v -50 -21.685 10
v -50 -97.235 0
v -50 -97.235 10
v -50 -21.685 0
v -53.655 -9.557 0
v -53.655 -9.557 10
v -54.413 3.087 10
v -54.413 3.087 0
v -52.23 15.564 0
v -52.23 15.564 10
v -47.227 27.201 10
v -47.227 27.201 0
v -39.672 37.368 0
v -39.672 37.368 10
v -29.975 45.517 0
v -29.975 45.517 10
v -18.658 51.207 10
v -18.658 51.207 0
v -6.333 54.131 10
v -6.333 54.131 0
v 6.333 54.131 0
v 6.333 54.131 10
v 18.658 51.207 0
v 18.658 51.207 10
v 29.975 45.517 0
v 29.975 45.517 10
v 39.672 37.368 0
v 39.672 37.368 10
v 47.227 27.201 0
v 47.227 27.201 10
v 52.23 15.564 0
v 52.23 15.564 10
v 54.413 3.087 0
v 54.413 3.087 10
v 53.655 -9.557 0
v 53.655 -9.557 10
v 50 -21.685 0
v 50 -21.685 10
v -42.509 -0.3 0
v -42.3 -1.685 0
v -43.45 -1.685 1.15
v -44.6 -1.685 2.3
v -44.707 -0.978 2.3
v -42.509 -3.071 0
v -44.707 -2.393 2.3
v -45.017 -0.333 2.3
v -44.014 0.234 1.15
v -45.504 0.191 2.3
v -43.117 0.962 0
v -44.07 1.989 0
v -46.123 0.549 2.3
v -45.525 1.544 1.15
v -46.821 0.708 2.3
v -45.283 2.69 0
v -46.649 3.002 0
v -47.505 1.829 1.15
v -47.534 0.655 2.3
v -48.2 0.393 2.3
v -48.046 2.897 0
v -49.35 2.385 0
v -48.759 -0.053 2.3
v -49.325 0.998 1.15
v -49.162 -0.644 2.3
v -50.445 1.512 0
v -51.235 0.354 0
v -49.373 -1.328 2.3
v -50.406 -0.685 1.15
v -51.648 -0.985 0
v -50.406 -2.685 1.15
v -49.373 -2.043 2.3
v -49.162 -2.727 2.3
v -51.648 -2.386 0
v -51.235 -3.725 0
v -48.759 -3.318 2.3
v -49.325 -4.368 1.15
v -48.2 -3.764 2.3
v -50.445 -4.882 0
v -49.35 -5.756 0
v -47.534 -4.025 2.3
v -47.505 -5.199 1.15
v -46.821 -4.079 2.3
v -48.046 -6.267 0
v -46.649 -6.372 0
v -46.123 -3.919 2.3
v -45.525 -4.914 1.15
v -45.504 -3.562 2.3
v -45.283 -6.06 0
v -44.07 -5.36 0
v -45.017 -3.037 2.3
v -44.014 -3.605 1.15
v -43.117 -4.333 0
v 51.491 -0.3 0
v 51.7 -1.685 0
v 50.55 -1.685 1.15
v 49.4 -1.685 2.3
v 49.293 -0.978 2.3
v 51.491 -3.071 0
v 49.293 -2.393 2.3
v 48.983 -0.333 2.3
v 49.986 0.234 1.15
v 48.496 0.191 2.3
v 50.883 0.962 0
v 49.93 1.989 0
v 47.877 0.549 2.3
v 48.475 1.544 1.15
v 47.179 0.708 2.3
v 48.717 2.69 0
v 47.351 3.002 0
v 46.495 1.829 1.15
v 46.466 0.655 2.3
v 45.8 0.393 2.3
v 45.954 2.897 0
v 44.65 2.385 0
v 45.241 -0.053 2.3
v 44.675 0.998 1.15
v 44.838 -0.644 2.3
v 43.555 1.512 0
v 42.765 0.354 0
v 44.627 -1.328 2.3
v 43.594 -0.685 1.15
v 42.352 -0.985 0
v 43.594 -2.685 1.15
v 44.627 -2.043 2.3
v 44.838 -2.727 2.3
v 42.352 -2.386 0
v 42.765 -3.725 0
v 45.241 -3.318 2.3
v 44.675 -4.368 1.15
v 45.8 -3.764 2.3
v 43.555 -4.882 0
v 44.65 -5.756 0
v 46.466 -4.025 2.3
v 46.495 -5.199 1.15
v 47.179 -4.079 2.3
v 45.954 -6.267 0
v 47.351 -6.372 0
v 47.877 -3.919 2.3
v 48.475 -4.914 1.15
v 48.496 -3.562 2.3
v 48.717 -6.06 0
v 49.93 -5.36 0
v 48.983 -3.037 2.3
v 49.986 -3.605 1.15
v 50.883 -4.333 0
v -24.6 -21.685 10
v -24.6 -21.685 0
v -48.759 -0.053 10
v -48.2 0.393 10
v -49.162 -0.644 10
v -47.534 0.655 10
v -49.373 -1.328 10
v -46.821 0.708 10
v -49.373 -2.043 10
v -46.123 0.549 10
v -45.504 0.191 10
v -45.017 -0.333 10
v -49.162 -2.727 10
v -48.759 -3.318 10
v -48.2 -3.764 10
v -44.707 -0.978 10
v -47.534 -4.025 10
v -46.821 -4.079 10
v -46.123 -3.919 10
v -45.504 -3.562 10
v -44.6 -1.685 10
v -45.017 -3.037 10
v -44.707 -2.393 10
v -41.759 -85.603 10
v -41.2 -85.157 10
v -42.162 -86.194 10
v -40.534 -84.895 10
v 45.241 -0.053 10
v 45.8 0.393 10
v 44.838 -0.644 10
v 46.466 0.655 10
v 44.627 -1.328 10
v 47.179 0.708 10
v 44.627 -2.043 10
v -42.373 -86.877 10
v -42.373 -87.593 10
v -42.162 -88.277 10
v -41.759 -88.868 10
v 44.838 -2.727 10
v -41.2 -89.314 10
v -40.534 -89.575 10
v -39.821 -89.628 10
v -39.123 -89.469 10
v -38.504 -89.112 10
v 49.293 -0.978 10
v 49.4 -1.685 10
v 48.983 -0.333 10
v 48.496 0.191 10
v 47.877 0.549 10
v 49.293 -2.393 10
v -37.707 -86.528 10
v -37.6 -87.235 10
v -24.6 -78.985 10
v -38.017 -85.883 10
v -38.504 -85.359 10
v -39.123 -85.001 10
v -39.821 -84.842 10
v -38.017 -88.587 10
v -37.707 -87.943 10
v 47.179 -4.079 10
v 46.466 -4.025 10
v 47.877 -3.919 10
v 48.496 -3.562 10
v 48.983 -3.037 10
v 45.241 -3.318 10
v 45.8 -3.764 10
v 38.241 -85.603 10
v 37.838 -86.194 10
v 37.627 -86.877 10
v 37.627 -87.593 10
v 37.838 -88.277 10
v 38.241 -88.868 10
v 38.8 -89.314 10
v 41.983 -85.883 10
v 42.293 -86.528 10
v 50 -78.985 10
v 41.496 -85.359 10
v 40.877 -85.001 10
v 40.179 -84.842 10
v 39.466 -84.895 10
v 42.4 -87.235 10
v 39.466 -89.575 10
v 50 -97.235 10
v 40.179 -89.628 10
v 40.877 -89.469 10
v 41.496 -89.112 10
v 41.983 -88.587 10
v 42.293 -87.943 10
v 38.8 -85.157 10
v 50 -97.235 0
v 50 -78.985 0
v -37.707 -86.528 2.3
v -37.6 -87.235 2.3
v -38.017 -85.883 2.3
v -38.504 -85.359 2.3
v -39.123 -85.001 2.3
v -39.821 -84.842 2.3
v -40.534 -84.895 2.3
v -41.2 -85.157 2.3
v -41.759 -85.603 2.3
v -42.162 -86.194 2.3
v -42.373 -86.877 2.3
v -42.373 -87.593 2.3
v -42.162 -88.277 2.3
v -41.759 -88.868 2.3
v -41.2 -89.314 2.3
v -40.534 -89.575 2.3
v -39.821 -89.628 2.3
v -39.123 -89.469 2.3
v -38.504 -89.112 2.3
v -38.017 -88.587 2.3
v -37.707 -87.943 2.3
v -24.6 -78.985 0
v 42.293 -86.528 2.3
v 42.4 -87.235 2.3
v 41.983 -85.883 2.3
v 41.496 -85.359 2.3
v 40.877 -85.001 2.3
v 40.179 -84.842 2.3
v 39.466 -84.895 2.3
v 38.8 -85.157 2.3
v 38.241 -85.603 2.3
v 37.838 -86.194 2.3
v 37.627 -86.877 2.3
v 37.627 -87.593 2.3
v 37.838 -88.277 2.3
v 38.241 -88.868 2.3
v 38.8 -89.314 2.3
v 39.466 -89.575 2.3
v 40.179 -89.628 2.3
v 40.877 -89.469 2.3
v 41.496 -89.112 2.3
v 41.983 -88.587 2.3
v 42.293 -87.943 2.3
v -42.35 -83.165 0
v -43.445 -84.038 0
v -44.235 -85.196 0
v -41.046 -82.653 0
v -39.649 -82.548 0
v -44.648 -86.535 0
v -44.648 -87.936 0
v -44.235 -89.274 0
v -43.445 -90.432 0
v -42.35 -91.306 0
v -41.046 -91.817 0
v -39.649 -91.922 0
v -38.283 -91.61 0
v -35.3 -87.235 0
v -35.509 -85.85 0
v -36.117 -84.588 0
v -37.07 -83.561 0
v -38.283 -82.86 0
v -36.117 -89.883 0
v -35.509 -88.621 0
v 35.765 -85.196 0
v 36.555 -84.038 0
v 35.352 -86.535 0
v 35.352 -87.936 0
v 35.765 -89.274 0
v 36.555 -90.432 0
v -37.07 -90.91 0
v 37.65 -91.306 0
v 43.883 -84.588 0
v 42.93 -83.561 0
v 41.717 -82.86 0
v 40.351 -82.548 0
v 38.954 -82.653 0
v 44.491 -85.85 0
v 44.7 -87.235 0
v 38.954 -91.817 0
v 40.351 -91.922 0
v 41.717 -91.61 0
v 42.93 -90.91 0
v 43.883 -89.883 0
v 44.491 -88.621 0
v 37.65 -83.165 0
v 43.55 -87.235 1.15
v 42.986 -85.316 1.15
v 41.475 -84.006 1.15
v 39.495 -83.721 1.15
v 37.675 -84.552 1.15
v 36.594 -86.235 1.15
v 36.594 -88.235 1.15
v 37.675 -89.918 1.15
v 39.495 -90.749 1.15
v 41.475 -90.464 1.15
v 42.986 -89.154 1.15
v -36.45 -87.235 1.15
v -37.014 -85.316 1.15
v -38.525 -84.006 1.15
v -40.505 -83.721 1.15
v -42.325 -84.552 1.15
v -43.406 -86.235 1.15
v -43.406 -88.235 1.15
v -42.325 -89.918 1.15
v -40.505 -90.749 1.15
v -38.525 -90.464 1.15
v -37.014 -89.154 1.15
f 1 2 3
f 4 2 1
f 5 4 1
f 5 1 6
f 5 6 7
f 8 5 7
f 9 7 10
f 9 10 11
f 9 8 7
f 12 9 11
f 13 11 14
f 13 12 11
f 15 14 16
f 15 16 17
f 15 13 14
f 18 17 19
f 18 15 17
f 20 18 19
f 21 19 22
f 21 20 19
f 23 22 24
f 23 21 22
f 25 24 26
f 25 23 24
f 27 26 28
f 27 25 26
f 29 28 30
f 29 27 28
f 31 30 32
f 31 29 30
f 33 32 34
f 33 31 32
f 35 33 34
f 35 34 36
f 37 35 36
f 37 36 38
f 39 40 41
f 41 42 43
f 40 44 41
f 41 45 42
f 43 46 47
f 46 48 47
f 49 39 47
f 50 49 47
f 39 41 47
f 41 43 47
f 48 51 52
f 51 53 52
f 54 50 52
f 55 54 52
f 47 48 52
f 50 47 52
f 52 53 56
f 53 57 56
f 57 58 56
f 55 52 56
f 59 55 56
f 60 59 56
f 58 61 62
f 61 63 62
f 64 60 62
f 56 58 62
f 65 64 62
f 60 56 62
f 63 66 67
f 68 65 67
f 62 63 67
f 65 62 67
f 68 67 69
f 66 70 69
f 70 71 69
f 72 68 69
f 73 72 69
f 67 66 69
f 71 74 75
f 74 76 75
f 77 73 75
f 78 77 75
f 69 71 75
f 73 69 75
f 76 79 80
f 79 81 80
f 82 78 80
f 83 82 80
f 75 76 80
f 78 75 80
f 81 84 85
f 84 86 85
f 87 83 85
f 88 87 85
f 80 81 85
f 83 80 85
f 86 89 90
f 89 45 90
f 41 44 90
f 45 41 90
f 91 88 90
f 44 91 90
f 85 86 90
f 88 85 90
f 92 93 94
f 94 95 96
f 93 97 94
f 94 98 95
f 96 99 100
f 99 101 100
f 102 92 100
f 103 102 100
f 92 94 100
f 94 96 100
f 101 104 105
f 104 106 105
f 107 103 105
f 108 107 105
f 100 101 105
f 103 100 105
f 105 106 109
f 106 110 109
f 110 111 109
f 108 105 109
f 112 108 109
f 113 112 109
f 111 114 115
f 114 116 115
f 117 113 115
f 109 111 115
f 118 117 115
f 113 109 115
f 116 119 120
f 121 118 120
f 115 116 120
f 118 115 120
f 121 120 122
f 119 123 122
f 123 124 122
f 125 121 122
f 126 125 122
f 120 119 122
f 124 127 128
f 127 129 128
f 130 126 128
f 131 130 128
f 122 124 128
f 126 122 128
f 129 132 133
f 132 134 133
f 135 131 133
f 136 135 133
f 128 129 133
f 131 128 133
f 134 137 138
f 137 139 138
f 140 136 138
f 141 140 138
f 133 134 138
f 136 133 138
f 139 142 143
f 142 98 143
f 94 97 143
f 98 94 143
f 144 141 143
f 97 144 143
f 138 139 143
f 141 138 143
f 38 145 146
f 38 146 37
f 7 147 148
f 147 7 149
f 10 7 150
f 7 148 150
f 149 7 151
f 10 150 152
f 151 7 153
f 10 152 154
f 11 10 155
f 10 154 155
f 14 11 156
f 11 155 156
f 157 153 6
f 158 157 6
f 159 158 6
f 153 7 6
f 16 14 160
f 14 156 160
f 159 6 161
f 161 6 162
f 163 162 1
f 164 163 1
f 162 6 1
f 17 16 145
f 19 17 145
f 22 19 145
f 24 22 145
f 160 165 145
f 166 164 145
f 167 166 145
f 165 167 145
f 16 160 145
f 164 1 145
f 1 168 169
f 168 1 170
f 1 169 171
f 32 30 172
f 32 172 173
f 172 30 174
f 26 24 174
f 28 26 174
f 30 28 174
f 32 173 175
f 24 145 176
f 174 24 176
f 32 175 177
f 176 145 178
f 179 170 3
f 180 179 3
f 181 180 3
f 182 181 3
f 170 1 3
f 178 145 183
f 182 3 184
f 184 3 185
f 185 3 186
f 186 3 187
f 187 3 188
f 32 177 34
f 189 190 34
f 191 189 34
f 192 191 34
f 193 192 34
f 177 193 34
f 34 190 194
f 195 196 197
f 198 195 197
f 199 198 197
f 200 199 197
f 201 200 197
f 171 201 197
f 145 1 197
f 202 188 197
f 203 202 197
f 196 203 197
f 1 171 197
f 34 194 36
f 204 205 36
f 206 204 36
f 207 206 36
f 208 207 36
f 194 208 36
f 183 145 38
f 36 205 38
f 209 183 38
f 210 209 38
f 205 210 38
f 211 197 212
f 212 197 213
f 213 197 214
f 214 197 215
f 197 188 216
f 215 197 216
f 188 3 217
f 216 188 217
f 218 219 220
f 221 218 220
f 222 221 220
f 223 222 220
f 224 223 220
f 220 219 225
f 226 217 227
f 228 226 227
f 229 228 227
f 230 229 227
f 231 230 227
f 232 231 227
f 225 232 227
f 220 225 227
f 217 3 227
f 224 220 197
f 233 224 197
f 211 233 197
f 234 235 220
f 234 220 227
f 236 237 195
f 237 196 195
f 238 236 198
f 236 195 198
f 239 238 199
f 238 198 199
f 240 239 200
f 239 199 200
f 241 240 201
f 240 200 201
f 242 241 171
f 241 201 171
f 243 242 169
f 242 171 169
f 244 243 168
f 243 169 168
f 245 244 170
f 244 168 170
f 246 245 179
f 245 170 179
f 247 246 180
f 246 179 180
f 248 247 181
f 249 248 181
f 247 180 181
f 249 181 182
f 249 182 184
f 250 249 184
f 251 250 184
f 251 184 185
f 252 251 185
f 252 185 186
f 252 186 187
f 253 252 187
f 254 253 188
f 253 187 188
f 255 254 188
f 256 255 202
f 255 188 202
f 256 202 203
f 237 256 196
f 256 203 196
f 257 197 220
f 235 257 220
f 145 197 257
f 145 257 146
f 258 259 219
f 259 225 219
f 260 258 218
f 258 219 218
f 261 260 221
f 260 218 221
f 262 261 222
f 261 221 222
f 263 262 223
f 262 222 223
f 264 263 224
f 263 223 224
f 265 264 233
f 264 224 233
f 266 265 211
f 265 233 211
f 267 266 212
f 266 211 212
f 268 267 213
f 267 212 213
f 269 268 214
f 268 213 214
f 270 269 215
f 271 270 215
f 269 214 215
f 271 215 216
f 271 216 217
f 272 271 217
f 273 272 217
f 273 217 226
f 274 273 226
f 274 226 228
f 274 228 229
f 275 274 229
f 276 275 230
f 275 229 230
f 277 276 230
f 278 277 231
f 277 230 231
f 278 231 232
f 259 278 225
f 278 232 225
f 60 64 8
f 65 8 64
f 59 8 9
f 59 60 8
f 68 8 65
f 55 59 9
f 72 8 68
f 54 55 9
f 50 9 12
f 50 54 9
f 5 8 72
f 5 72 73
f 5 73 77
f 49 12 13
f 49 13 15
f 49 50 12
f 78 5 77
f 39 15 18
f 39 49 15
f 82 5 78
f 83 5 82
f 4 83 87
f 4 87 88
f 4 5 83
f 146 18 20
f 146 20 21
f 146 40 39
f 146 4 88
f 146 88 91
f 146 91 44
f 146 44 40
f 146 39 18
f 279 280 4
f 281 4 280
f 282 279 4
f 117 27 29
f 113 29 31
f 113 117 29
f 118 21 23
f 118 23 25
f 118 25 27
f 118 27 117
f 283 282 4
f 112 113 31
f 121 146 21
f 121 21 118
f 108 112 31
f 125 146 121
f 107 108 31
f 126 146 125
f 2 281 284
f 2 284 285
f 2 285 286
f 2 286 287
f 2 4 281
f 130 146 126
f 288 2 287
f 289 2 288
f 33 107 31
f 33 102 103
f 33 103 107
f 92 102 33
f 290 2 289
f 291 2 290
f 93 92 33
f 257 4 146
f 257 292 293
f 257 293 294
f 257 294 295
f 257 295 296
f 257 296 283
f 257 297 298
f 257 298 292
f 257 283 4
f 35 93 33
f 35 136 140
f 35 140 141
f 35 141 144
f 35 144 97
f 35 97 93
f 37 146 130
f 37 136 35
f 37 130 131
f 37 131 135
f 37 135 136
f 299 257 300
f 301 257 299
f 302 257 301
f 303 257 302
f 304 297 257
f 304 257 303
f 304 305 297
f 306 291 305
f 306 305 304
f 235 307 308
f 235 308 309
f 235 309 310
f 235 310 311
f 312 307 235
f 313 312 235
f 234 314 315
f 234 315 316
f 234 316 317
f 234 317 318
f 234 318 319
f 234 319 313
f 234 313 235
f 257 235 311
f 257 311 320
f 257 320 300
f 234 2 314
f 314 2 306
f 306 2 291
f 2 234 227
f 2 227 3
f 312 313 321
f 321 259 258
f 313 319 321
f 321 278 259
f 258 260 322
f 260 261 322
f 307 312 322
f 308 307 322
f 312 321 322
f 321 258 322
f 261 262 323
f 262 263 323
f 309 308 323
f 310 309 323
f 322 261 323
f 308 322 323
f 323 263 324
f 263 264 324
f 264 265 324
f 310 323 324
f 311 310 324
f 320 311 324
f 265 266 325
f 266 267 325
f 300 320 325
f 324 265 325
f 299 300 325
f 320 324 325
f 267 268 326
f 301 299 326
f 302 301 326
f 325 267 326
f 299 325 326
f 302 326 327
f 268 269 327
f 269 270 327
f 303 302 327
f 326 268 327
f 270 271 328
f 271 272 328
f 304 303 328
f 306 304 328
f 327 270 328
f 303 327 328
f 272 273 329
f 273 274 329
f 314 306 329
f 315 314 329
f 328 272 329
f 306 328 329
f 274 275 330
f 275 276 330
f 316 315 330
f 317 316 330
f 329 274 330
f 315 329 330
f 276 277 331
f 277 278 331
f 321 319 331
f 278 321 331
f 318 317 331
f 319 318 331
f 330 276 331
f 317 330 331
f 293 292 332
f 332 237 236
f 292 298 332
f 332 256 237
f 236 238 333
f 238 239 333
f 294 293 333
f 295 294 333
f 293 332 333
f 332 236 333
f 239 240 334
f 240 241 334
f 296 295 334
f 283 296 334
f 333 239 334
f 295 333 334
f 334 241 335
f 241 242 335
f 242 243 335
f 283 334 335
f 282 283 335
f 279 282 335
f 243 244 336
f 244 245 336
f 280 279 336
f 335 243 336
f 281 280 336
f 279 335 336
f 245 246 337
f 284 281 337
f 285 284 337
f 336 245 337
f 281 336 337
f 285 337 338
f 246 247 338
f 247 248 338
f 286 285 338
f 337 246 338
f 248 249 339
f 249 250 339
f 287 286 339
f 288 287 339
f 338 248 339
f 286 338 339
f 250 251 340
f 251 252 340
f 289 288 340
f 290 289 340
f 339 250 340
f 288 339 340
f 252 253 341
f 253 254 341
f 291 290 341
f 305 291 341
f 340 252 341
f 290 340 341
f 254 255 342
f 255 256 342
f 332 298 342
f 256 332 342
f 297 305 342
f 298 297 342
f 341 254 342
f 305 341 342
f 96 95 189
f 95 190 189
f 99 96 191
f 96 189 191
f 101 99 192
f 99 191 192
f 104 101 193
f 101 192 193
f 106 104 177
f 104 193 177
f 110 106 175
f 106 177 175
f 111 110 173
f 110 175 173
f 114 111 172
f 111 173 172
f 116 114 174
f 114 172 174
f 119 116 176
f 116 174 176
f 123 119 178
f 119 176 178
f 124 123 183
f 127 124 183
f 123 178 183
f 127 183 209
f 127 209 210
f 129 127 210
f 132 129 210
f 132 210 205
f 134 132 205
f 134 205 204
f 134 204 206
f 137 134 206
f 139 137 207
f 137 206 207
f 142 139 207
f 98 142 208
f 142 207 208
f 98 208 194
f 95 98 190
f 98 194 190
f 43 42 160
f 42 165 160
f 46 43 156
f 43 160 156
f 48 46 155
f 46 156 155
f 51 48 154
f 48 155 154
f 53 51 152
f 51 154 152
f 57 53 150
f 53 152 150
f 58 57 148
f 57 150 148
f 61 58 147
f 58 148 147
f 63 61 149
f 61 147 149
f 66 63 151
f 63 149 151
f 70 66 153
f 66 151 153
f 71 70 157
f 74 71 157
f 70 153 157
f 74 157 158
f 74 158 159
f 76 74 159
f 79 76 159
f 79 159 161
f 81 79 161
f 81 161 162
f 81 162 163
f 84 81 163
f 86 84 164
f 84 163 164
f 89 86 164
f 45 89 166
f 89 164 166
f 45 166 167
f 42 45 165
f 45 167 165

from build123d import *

# Parameters (mm, degrees)
BOSS_EXTRUDE1_DEPTH                             = 10
CSK_FOR_M4_FLAT_HEAD_MACHINE_SCREW1_D           = 4.8
CSK_FOR_M4_FLAT_HEAD_MACHINE_SCREW1_CSINK_D     = 9.4
CSK_FOR_M4_FLAT_HEAD_MACHINE_SCREW1_CSINK_ANGLE = 90
SKETCH6_W                                       = 74.6
SKETCH6_H                                       = 57.3
CUT_EXTRUDE1_DEPTH                              = 15


with BuildPart() as part:
    # Sketch1 → Boss-Extrude1 (new body)
    with BuildSketch(Plane(origin=(0, 0, 0), x_dir=(-1, 0, 0), z_dir=(0, 0, 1))):
        with BuildLine():
            Line((-50, 21.685248442), (-50, 97.235188276))
            Line((-50, 97.235188276), (50, 97.235188276))
            Line((50, 97.235188276), (50, 21.685248442))
            ThreePointArc((50, 21.685248442), (0, -54.5), (-50, 21.685248442))
        make_face()
    extrude(amount=BOSS_EXTRUDE1_DEPTH)

    # CSK for M4 Flat Head Machine Screw1 (through all)
    with Locations(Plane(origin=(47, -1.685248442, 0), x_dir=(-1, 0, 0), z_dir=(0, 0, -1))):
        with Locations((0, 0), (94, 0), (87, -85.549939834), (7, -85.549939834)):
            CounterSinkHole(CSK_FOR_M4_FLAT_HEAD_MACHINE_SCREW1_D / 2, CSK_FOR_M4_FLAT_HEAD_MACHINE_SCREW1_CSINK_D / 2, counter_sink_angle=CSK_FOR_M4_FLAT_HEAD_MACHINE_SCREW1_CSINK_ANGLE)

    # Sketch6 → Cut-Extrude1 (cut)
    with BuildSketch(Plane.XY.offset(10)):
        with Locations((12.7, -50.335248442)):
            Rectangle(SKETCH6_W, SKETCH6_H)
    extrude(amount=-CUT_EXTRUDE1_DEPTH, mode=Mode.SUBTRACT)


solid = part.part
